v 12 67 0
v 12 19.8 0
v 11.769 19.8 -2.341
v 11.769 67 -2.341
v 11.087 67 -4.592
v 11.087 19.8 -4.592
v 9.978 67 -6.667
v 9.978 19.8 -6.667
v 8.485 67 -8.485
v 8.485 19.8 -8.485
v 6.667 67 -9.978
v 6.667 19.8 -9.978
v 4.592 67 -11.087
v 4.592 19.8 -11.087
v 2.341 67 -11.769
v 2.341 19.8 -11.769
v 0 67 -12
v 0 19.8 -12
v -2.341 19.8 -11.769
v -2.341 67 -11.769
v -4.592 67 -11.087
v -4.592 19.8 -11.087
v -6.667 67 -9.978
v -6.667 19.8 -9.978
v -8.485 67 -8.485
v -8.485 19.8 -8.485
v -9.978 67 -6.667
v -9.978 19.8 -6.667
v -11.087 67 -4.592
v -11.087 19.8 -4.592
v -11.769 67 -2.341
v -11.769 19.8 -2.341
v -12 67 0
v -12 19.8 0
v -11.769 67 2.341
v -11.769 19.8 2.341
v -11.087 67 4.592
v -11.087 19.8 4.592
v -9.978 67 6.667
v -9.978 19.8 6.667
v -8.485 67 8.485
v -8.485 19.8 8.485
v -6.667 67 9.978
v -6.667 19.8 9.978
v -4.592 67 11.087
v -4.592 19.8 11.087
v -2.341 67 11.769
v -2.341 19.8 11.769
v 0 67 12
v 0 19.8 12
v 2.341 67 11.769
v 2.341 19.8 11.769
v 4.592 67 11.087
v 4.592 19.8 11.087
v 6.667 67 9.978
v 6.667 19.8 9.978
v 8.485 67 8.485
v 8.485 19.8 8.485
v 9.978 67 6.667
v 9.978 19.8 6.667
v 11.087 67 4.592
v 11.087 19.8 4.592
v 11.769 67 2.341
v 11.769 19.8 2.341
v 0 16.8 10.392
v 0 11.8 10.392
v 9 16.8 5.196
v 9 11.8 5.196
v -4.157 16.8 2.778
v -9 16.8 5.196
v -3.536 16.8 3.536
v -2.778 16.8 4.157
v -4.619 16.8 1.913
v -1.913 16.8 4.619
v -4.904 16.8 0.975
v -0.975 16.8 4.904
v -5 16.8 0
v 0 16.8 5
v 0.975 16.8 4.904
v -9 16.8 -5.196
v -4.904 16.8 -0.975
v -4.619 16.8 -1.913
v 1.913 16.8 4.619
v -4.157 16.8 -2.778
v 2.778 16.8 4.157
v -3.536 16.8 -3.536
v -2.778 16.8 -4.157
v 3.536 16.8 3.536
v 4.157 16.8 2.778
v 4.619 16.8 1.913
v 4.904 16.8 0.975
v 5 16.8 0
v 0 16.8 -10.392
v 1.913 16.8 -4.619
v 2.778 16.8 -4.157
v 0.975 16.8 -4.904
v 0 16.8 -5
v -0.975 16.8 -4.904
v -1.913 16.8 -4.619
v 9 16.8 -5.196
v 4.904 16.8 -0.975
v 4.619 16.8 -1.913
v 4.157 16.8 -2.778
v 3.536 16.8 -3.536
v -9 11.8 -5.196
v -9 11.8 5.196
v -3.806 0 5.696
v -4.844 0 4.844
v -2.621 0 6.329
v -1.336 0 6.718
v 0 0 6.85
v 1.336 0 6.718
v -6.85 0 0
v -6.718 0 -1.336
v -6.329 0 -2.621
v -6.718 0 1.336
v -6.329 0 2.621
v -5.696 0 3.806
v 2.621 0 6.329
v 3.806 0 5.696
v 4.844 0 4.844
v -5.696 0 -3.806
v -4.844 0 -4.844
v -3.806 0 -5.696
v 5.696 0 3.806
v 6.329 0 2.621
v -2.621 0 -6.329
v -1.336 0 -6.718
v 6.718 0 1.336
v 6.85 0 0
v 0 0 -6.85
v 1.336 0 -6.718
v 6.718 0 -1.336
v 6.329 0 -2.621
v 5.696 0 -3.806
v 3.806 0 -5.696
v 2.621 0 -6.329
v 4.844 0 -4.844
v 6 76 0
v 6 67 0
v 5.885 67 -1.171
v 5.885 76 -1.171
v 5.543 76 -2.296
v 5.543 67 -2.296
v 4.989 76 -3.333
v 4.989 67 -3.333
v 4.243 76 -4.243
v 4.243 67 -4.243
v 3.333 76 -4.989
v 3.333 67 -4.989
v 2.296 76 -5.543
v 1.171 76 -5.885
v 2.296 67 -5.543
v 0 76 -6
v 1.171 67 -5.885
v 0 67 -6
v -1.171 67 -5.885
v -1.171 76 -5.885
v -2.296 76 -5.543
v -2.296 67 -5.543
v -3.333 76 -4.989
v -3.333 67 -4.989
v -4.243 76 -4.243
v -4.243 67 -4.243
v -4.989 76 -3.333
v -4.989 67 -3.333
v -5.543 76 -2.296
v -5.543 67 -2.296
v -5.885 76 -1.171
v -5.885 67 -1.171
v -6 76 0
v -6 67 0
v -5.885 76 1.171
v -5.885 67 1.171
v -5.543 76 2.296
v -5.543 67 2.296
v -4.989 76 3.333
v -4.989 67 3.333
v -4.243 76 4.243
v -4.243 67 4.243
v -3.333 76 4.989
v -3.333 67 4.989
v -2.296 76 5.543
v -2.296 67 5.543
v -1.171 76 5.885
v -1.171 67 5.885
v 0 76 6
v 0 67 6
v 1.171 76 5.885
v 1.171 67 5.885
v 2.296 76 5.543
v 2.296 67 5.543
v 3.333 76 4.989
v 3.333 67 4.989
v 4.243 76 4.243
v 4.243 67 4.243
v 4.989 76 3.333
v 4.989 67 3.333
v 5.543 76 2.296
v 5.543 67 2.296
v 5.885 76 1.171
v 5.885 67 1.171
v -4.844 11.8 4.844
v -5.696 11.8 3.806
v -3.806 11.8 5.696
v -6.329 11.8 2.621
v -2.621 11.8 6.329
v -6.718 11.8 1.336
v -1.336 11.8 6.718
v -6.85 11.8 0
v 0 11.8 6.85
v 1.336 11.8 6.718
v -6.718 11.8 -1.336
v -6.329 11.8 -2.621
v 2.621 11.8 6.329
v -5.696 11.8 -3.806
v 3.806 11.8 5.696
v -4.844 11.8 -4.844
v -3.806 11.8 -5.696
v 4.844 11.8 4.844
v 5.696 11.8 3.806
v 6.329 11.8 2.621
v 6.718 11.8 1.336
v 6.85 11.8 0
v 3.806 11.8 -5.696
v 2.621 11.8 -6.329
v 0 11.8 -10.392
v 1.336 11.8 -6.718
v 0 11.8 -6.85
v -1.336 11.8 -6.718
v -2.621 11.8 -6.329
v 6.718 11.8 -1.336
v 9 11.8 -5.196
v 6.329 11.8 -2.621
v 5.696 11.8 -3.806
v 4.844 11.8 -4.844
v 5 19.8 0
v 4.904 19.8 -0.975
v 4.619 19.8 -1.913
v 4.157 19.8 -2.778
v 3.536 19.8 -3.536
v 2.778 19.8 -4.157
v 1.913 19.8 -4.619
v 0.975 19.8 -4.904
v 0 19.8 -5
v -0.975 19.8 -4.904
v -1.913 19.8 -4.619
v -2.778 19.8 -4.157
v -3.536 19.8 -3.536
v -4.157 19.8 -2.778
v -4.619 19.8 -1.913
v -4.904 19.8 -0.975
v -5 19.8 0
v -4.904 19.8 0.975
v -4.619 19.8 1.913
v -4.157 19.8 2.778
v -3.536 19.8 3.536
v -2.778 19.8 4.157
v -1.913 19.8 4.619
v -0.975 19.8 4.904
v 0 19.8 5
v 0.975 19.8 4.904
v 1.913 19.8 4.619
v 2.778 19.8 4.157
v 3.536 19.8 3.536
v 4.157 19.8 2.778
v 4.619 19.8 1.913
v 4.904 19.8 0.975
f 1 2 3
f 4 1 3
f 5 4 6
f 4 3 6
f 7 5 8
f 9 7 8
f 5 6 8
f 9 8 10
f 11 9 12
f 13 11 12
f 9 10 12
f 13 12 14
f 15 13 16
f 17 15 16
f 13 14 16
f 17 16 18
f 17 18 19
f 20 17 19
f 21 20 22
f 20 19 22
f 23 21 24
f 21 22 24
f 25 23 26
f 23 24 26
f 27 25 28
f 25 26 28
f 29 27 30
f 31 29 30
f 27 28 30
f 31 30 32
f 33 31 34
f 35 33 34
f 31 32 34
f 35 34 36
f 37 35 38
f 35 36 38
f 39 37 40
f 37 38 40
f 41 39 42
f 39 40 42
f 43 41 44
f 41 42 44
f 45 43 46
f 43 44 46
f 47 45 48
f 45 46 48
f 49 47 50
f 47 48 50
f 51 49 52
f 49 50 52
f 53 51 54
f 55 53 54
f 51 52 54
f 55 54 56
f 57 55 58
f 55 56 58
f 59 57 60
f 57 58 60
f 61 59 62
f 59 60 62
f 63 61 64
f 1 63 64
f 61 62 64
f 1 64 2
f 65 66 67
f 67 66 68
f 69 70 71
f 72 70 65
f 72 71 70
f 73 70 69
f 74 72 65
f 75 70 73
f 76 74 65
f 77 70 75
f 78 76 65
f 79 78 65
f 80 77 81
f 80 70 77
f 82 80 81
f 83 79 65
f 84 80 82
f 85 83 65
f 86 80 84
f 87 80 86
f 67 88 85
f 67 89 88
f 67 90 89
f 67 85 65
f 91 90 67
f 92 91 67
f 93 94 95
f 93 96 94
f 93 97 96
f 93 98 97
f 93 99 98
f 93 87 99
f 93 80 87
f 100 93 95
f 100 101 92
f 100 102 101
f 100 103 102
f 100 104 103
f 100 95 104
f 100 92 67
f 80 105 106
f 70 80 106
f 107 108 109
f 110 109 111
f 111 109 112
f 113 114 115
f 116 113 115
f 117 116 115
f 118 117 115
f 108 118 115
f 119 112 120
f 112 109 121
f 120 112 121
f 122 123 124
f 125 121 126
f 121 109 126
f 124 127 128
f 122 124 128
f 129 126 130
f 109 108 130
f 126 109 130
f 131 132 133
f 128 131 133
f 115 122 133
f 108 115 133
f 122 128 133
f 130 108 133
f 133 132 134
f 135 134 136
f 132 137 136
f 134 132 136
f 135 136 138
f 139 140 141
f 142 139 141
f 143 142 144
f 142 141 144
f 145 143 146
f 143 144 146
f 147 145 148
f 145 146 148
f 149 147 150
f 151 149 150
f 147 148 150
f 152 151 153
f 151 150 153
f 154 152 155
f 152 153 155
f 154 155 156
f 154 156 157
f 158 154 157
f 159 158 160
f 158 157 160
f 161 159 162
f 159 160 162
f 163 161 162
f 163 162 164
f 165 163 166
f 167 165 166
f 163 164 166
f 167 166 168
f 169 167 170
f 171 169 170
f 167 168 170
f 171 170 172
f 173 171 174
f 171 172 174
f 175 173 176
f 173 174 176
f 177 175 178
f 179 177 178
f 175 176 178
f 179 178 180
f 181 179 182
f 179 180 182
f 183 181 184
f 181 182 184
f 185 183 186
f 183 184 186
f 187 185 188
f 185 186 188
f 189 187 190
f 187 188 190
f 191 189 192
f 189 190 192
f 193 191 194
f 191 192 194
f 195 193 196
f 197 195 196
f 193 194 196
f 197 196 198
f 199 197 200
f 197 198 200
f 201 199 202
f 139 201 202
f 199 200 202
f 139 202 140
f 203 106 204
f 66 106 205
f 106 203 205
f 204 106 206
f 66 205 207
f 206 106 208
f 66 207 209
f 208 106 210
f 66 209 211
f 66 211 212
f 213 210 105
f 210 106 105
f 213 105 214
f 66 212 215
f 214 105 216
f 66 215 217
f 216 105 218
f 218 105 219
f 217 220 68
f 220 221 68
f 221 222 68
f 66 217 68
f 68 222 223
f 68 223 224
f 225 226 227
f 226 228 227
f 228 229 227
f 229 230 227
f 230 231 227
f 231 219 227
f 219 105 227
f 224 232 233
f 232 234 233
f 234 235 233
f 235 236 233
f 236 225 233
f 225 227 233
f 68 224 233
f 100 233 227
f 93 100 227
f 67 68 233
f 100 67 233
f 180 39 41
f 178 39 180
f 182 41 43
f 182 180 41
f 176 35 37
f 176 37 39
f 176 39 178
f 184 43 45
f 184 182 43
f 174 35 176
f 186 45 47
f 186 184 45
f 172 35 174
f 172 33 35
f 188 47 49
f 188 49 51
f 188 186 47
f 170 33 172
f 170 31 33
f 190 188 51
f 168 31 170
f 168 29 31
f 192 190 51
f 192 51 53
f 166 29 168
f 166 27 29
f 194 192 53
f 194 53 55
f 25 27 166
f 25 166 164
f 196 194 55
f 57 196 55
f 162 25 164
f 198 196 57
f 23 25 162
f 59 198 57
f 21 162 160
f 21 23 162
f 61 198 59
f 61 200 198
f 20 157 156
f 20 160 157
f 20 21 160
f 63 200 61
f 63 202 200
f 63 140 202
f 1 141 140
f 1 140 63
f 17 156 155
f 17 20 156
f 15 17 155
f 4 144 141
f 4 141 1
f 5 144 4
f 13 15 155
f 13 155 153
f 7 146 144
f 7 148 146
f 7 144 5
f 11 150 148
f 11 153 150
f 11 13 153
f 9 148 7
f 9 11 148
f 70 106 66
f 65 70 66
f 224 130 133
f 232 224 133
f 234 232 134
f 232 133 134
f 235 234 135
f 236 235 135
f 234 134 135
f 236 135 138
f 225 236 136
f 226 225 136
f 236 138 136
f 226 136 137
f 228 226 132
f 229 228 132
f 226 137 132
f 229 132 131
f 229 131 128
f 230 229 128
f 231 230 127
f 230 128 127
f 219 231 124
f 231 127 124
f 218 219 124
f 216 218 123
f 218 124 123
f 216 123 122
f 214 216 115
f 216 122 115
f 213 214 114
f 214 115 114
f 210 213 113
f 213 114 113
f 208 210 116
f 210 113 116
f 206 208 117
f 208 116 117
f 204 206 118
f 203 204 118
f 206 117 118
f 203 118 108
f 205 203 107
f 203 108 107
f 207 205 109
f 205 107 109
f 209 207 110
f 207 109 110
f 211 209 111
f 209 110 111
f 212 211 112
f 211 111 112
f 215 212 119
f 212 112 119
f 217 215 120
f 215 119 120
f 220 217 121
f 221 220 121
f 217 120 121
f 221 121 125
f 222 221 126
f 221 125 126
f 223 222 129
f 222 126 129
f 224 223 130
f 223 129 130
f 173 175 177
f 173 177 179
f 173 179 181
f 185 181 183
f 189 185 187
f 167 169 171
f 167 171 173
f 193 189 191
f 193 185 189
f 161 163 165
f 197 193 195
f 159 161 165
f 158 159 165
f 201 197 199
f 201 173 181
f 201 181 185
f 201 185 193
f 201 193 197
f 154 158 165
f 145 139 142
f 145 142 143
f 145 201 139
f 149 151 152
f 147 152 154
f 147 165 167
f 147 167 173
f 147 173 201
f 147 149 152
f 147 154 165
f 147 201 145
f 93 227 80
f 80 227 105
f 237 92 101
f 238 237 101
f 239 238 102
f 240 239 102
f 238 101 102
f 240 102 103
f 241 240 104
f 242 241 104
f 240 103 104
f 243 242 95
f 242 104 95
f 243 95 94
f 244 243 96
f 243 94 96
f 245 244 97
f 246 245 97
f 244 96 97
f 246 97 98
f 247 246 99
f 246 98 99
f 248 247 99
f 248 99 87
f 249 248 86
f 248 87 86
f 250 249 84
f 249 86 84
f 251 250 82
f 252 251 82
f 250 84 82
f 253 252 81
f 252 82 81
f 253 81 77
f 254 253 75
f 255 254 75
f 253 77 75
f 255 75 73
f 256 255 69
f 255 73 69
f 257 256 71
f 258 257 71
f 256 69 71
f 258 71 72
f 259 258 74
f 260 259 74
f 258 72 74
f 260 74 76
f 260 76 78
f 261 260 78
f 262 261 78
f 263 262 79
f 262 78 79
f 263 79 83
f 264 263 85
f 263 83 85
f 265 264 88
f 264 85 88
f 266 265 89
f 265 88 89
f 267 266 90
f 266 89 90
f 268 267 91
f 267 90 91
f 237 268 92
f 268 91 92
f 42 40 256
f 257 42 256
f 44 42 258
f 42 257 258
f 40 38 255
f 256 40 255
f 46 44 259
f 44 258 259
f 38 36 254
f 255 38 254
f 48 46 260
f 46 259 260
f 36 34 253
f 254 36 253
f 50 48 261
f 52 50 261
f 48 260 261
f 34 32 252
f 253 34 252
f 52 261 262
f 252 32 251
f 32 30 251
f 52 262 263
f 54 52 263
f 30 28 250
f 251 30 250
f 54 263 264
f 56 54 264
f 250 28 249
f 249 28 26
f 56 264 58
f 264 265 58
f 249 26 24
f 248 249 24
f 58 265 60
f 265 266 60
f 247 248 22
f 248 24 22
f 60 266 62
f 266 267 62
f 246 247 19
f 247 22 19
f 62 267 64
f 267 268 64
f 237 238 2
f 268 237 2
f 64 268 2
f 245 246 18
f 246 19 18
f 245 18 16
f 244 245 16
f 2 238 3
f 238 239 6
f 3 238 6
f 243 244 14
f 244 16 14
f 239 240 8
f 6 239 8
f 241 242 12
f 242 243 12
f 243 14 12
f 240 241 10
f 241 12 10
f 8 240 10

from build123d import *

# Parameters (mm, degrees)
SKETCH1_R           = 6.85
BOSS_EXTRUDE1_DEPTH = 11.8
BOSS_EXTRUDE2_DEPTH = 5
SKETCH3_R           = 5
BOSS_EXTRUDE3_DEPTH = 3
SKETCH4_R           = 12
BOSS_EXTRUDE4_DEPTH = 47.2
SKETCH5_R           = 6
BOSS_EXTRUDE5_DEPTH = 9


with BuildPart() as part:
    # Sketch1 → Boss-Extrude1 (new body)
    with BuildSketch(Plane(origin=(0, 0, 0), x_dir=(1, 0, 0), z_dir=(0, 1, 0))):
        Circle(SKETCH1_R)
    extrude(amount=BOSS_EXTRUDE1_DEPTH)

    # Sketch2 → Boss-Extrude2 (add)
    with BuildSketch(Plane(origin=(0, 11.8, 0), x_dir=(1, 0, 0), z_dir=(0, 1, 0))):
        Polygon((0, 10.392304845), (-9, 5.196152423), (-9, -5.196152423), (0, -10.392304845), (9, -5.196152423), (9, 5.196152423), align=None)
    extrude(amount=BOSS_EXTRUDE2_DEPTH)

    # Sketch3 → Boss-Extrude3 (add)
    with BuildSketch(Plane(origin=(0, 16.8, 0), x_dir=(1, 0, 0), z_dir=(0, 1, 0))):
        Circle(SKETCH3_R)
    extrude(amount=BOSS_EXTRUDE3_DEPTH)

    # Sketch4 → Boss-Extrude4 (add)
    with BuildSketch(Plane(origin=(0, 19.8, 0), x_dir=(1, 0, 0), z_dir=(0, 1, 0))):
        Circle(SKETCH4_R)
    extrude(amount=BOSS_EXTRUDE4_DEPTH)

    # Sketch5 → Boss-Extrude5 (add)
    with BuildSketch(Plane(origin=(0, 67, 0), x_dir=(1, 0, 0), z_dir=(0, 1, 0))):
        Circle(SKETCH5_R)
    extrude(amount=BOSS_EXTRUDE5_DEPTH)


solid = part.part
